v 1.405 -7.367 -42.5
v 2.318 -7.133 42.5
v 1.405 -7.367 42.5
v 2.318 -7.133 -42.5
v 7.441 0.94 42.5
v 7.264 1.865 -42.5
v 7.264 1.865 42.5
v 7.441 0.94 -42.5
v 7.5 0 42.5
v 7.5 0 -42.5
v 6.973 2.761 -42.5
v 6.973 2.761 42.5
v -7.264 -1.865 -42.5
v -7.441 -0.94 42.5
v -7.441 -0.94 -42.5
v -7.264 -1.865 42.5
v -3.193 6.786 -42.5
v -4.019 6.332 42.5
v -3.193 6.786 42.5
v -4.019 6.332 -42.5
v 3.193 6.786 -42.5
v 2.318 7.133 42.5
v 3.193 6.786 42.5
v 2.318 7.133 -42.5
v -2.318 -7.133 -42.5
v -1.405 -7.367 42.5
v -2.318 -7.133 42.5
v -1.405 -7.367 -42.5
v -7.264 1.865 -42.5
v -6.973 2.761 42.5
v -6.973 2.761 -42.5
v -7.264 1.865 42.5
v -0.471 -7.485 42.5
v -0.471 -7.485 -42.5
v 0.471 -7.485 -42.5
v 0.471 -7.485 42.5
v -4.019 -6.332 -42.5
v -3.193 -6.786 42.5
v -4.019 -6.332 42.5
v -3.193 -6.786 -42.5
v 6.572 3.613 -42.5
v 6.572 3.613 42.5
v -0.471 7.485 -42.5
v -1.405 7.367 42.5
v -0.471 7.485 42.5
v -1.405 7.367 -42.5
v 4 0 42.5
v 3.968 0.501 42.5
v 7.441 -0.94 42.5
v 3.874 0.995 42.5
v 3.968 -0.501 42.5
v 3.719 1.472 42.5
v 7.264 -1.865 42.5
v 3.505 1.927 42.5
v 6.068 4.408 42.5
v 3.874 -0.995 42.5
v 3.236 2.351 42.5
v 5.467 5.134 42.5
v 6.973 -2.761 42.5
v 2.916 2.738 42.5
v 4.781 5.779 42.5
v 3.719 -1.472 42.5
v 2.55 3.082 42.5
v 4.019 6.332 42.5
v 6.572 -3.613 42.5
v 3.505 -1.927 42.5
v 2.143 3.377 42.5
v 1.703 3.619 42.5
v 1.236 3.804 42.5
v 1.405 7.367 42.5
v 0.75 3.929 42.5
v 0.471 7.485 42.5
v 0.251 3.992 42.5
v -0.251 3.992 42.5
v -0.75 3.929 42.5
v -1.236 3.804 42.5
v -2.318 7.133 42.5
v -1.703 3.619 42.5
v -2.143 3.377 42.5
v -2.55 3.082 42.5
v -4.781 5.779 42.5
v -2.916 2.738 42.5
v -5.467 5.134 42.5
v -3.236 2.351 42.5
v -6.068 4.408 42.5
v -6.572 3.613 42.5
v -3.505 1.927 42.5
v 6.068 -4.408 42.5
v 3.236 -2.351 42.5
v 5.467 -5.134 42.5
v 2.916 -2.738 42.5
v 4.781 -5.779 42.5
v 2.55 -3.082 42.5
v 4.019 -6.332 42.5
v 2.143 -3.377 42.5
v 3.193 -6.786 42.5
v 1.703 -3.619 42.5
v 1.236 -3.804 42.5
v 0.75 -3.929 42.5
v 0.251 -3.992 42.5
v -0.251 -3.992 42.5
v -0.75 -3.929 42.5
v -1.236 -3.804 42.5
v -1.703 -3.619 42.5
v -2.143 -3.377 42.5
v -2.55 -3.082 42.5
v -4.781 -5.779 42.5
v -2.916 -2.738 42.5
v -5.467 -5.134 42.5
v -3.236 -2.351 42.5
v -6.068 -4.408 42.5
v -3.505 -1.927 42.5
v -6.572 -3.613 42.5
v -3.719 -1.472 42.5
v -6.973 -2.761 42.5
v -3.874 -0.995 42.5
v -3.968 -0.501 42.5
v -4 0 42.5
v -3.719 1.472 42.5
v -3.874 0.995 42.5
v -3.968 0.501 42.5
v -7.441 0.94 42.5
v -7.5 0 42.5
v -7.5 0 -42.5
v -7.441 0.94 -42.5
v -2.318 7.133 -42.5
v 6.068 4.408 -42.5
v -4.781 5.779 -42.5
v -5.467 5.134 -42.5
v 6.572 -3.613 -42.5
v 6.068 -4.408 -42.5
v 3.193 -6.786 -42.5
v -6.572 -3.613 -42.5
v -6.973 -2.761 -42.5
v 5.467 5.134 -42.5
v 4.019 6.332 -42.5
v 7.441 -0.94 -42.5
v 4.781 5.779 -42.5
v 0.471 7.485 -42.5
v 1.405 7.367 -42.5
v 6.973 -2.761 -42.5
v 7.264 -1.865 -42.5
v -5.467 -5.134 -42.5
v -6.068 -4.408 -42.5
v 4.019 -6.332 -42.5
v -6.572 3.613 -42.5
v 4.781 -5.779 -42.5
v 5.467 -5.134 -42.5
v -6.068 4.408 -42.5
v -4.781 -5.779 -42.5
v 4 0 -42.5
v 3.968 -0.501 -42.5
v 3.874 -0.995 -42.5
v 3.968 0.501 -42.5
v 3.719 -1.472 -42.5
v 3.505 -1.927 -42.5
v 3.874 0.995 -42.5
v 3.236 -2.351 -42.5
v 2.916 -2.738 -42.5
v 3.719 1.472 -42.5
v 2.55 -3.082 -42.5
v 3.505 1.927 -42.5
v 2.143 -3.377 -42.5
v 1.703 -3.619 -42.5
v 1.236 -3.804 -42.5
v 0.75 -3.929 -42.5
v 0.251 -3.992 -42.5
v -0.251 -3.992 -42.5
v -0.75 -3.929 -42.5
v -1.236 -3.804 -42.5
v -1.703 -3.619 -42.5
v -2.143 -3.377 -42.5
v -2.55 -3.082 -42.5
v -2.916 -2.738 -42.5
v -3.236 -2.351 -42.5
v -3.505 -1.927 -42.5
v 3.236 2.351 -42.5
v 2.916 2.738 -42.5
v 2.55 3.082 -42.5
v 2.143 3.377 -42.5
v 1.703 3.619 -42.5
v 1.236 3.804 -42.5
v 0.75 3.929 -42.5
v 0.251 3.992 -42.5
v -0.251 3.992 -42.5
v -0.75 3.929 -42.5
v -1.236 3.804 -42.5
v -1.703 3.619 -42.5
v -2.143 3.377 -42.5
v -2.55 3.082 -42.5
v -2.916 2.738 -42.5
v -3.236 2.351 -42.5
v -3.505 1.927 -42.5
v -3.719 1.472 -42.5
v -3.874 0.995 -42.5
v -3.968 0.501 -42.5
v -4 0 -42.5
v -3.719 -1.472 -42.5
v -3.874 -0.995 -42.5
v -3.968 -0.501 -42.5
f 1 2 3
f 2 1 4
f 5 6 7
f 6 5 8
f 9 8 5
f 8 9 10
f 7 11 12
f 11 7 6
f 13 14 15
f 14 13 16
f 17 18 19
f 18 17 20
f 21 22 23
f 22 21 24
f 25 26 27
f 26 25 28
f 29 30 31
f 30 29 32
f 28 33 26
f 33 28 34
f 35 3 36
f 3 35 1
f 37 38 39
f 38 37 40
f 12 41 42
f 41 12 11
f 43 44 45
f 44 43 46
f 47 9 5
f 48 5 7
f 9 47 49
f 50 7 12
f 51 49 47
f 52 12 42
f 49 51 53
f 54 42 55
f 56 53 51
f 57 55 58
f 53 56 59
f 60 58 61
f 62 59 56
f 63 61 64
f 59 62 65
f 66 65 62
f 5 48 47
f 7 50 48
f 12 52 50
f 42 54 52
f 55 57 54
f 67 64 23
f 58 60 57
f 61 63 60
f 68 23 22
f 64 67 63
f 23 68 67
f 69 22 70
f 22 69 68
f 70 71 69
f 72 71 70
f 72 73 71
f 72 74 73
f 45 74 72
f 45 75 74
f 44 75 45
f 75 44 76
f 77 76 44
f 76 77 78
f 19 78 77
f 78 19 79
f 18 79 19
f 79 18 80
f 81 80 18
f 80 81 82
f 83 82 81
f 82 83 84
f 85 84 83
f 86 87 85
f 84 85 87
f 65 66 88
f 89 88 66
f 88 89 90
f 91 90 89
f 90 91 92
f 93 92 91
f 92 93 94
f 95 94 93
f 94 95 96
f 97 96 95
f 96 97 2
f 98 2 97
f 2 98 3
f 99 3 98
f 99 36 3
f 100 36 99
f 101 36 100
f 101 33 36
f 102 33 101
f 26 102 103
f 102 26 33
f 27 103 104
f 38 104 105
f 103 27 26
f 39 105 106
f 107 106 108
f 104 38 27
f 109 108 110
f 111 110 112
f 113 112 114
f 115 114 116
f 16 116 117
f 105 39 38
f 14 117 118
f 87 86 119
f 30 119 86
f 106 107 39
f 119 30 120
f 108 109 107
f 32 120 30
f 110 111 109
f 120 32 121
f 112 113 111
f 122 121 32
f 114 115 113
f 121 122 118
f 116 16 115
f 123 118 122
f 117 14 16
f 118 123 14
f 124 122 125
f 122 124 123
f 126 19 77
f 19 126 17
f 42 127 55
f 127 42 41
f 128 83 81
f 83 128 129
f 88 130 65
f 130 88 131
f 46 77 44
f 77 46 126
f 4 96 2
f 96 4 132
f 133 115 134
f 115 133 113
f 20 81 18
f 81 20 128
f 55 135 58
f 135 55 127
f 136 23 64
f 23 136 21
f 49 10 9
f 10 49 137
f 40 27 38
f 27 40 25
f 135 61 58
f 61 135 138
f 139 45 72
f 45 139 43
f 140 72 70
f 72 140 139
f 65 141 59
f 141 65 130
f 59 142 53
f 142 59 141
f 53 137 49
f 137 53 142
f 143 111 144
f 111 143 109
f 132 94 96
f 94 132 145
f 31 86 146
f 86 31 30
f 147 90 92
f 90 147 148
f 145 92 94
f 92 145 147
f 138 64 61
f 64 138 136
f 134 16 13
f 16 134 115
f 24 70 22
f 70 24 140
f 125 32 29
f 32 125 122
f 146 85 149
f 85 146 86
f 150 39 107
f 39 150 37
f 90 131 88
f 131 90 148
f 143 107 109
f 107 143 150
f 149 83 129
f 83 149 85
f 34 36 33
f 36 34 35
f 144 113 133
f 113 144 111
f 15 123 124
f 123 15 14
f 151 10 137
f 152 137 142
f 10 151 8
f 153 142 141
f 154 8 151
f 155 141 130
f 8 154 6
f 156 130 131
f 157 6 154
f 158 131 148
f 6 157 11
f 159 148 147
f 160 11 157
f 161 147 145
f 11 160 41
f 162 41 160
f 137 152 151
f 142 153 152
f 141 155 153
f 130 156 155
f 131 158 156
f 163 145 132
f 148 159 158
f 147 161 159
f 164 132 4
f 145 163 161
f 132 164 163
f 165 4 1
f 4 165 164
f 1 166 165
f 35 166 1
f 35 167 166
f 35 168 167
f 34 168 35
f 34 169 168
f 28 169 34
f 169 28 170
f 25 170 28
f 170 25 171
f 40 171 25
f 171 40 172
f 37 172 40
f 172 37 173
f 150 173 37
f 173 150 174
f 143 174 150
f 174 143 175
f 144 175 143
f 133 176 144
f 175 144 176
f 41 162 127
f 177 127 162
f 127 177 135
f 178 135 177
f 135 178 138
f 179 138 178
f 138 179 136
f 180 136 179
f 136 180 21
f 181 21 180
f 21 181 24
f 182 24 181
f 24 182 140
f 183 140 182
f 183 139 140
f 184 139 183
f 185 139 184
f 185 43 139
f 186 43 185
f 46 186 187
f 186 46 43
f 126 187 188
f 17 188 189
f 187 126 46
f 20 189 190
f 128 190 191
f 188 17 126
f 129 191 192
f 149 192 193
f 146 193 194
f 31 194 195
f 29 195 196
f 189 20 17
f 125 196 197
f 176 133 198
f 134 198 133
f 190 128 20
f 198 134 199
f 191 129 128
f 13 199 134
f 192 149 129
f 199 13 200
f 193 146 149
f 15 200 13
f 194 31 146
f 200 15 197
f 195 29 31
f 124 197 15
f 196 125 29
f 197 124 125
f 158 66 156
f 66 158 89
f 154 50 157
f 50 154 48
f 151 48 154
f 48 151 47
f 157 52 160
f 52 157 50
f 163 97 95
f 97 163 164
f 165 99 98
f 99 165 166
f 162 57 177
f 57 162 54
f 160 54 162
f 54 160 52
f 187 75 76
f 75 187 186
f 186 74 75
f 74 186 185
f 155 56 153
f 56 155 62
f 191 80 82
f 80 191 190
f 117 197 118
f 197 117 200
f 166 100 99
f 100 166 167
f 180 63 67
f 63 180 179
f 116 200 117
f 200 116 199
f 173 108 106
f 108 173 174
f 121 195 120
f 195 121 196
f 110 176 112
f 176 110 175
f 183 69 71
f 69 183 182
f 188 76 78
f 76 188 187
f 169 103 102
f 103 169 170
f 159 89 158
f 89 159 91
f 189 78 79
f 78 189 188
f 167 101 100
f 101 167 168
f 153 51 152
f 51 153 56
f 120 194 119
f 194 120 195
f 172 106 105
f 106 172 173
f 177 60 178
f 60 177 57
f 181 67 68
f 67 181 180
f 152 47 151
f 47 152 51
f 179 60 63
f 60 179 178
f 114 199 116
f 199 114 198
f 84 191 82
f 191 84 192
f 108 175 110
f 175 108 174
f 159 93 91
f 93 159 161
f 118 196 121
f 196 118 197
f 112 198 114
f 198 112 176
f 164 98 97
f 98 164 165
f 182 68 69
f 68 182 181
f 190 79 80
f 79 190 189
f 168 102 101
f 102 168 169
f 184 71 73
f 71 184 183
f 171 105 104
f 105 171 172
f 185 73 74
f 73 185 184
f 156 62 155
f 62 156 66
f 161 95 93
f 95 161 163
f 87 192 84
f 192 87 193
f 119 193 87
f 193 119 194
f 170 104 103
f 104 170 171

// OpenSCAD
$fn = 50;


difference() {
	union() {
		translate(v = [0, 0, -42.5000000000]) {
			cylinder(h = 85, r = 7.5000000000);
		}
	}
	union() {
		translate(v = [0, 0, -100.0000000000]) {
			cylinder(h = 200, r = 4.0000000000);
		}
	}
}
